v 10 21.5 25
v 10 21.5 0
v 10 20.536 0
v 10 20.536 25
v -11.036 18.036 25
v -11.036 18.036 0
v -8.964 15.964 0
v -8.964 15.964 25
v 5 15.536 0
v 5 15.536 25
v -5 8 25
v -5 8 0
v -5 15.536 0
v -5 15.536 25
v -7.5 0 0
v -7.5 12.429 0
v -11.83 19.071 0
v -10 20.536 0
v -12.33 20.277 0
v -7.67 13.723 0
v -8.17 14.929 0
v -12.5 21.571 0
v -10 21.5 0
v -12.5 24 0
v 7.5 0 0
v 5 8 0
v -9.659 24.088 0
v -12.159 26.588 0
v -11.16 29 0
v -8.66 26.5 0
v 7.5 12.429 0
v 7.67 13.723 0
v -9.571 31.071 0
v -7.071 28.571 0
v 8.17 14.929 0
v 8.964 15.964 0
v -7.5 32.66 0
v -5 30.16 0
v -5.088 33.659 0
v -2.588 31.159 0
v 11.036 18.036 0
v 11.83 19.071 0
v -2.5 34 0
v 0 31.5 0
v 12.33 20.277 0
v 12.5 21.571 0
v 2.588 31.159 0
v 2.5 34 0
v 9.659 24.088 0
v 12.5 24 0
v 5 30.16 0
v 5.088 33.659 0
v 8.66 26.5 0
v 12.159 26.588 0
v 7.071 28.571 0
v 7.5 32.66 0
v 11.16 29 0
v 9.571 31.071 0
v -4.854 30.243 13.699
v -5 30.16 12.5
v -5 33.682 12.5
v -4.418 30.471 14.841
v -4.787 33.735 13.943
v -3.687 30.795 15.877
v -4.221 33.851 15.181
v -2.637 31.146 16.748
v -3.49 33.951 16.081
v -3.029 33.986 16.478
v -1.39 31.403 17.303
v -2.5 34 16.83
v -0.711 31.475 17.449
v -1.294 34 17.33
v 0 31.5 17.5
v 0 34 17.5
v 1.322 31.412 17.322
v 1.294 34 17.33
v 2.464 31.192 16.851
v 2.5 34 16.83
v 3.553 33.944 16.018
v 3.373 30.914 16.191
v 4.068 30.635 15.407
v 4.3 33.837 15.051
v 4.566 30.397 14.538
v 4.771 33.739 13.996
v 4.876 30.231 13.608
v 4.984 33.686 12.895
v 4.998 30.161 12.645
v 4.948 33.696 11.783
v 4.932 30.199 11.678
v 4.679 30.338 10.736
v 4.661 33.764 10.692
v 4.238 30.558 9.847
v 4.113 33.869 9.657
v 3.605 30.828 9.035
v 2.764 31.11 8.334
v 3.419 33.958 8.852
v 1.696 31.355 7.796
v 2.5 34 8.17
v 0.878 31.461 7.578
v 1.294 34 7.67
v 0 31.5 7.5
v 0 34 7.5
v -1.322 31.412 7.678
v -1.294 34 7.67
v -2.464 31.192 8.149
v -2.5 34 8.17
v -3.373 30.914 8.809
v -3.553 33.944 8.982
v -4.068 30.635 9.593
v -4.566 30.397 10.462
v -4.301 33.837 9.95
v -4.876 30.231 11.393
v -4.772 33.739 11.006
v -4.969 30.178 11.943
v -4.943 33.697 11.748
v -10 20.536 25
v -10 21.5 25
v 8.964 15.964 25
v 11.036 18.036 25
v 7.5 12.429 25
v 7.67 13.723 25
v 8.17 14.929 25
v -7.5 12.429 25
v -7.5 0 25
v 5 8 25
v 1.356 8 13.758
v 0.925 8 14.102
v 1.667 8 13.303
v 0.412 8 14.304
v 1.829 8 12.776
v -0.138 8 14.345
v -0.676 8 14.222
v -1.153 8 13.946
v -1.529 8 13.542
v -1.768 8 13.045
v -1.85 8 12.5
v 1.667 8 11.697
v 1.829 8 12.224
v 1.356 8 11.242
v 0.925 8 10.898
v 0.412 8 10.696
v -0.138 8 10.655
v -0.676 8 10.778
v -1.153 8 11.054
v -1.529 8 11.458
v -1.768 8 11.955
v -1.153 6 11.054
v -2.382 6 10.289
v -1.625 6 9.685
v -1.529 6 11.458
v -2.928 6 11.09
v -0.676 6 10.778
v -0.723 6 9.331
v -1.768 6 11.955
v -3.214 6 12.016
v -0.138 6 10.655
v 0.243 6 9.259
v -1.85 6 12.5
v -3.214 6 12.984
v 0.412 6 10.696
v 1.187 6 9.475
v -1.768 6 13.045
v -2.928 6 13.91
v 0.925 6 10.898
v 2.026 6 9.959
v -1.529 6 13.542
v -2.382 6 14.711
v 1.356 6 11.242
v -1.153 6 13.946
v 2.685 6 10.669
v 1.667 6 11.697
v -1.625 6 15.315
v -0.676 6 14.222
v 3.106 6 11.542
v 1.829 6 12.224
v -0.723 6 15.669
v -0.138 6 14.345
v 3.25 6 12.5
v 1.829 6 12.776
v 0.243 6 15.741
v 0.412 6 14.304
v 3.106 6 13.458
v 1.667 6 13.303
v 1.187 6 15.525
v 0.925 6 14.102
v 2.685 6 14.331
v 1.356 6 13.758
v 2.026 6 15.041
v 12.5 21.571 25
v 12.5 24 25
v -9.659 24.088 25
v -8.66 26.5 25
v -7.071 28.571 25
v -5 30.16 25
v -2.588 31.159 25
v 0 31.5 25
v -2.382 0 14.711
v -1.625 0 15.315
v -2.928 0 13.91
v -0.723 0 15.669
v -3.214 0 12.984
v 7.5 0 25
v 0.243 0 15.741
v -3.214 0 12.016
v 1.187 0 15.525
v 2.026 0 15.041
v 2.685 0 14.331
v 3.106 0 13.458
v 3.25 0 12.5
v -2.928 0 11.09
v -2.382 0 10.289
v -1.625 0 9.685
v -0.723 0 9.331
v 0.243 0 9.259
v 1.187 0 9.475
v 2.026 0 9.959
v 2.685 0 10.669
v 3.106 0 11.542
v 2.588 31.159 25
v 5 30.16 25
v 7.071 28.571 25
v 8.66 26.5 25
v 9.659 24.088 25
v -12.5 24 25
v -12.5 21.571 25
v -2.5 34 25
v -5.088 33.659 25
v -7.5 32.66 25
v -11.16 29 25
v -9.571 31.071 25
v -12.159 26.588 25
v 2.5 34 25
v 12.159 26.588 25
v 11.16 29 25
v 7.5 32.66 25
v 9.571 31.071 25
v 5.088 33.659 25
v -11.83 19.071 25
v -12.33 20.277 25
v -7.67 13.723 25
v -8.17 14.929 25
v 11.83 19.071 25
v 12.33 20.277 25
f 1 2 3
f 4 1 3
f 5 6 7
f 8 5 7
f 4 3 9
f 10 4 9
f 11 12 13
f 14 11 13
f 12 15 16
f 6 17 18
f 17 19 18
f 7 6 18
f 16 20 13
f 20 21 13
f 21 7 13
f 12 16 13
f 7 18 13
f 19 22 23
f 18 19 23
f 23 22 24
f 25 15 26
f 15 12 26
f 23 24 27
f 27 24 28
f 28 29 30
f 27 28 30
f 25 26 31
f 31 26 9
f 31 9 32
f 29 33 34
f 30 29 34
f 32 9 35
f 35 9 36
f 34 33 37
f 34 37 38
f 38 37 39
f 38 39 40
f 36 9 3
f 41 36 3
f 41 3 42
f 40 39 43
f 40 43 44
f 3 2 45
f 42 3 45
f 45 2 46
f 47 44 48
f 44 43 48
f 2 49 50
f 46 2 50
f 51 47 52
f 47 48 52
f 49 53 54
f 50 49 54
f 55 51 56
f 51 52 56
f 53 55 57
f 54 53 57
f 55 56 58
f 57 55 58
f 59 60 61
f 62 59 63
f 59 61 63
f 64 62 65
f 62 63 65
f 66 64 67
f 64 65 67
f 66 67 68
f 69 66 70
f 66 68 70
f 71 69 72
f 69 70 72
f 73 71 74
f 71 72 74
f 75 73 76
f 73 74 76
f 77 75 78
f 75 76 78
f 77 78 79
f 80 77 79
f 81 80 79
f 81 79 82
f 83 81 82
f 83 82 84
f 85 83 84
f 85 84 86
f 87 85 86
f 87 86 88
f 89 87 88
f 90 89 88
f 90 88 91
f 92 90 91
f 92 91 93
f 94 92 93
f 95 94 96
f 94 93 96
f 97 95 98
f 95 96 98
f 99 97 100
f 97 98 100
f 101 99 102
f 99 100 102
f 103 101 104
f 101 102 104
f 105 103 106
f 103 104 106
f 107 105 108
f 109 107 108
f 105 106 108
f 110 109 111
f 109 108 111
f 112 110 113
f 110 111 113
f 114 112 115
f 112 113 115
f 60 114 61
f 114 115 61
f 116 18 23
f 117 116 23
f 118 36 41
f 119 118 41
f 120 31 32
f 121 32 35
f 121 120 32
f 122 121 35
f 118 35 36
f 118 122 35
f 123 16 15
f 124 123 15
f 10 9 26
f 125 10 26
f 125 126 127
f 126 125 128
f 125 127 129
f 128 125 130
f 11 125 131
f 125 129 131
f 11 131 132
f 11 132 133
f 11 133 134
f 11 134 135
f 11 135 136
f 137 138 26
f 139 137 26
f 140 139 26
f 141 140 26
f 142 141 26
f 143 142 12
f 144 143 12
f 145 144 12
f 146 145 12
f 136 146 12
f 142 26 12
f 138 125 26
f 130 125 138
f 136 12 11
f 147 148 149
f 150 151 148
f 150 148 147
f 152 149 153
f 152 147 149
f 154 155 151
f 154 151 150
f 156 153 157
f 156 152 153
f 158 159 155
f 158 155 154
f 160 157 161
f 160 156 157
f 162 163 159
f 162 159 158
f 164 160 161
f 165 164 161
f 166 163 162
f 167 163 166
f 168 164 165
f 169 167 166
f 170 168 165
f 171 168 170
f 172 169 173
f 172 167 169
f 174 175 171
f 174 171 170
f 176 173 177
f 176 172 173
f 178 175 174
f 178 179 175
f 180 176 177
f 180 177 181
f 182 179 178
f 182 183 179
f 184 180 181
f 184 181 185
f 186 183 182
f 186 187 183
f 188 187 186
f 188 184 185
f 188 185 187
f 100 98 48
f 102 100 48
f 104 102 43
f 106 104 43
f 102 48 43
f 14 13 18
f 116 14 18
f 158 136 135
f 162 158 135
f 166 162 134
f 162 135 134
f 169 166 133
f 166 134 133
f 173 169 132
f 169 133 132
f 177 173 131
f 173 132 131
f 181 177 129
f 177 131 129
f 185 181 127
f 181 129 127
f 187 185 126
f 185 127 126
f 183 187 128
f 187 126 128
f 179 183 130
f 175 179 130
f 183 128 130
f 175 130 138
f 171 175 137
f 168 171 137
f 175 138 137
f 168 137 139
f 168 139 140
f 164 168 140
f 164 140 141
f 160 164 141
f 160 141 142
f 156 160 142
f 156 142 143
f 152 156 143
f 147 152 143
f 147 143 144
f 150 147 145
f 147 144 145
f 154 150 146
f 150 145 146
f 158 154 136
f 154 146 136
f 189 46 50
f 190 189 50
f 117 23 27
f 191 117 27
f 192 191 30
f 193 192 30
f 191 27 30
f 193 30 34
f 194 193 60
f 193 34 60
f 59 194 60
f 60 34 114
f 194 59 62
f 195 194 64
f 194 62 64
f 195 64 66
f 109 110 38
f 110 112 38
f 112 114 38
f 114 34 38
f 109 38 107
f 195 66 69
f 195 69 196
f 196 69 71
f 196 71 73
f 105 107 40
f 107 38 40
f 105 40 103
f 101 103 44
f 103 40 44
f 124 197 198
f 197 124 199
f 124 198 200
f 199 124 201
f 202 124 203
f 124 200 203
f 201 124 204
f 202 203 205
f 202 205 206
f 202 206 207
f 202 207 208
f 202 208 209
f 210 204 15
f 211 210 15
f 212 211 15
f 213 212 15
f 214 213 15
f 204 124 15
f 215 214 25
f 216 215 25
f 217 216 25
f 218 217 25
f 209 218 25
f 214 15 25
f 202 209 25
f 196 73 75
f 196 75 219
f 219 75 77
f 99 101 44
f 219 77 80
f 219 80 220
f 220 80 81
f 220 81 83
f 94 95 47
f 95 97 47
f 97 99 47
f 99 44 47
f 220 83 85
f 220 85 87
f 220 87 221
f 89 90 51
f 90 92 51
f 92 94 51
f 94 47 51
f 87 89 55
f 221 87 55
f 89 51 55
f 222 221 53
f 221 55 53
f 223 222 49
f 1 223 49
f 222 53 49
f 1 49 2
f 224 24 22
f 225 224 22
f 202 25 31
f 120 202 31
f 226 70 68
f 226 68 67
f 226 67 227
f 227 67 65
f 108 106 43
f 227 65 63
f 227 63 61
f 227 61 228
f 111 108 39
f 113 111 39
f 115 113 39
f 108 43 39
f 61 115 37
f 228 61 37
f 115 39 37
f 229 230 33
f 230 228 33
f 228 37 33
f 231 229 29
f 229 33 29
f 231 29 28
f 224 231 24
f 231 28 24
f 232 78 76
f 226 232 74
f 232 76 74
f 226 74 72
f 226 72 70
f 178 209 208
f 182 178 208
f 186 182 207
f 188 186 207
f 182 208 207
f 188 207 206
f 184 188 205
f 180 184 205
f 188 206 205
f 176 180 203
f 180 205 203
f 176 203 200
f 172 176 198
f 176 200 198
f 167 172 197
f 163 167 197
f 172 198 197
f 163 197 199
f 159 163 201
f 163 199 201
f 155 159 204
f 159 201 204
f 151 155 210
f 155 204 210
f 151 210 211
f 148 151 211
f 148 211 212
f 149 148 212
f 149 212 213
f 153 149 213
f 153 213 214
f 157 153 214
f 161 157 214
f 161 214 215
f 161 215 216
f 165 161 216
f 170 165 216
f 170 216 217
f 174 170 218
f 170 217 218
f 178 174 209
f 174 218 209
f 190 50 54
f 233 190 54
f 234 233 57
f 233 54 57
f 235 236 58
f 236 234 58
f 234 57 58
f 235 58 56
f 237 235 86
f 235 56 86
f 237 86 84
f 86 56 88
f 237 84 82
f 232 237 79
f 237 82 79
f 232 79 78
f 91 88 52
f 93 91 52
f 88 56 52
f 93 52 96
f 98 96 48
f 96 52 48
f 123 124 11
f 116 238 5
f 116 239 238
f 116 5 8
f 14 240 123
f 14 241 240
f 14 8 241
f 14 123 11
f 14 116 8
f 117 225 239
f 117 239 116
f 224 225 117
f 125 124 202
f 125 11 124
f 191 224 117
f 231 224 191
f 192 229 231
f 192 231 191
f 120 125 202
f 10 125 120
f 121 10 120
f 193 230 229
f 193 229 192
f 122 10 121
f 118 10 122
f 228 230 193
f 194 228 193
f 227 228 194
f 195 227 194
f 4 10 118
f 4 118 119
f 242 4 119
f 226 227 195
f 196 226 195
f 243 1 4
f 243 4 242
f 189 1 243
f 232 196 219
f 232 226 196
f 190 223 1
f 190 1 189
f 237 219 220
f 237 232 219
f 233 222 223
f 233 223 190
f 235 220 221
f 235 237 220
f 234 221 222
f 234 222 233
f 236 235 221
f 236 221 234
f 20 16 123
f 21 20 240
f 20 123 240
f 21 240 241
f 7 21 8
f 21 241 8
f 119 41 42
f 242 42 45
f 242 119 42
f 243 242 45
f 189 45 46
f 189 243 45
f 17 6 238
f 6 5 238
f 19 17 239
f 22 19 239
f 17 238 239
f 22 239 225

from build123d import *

# Parameters (mm, degrees)
F1_DEPTH    = 25
F2_R        = 5
F3_R        = 3.25
F4_DEPTH    = 6
F5_R        = 1.85
F6_DEPTH    = 2
F7_R        = 5
F8_DEPTH    = 8.9
F9_T1_DEPTH = 75


# Not quite as in the source:
# - a fillet or chamfer that OpenCascade refuses, or shapes differently, is made with other operations: its cross-section is extruded or revolved along the edge and cut away or added


with BuildPart() as f1:
    # F0 (on Top) → F1 (new body)
    with BuildSketch(Plane.XY):
        Polygon((-7.5, 0), (0, 0), (7.5, 0), (7.5, 14.5), (12.5, 19.5), (12.5, 34), (0, 34), (-12.5, 34), (-12.5, 19.5), (-7.5, 14.5), align=None)
        with BuildLine():
            Line((-10, 20.5355339059), (-10, 21.5))
            ThreePointArc((-10, 21.5), (-7.0710678119, 28.5710678119), (0, 31.5))
            ThreePointArc((0, 31.5), (7.0710678119, 28.5710678119), (10, 21.5))
            Line((10, 21.5), (10, 20.5355339059))
            Line((10, 20.5355339059), (5, 15.5355339059))
            Line((5, 15.5355339059), (5, 8))
            Line((5, 8), (-5, 8))
            Line((-5, 8), (-5, 15.5355339059))
            Line((-5, 15.5355339059), (-10, 20.5355339059))
        make_face(mode=Mode.SUBTRACT)
    extrude(amount=F1_DEPTH)

    # F2
    f2_edges = [f1.edges().sort_by_distance(p)[0] for p in [
        (-12.5, 19.5, 12.5),
        (-7.5, 14.5, 12.5),
        (12.5, 19.5, 12.5),
        (7.5, 14.5, 12.5),
    ]]
    fillet(f2_edges, radius=F2_R)

    # F3 (on face) → F4 (cut)
    with BuildSketch(Plane.XZ):
        with Locations((0, 12.5)):
            Circle(F3_R)
    extrude(amount=-F4_DEPTH, mode=Mode.SUBTRACT)

    # F5 (on face) → F6 (cut)
    with BuildSketch(Plane(origin=(0, 8, 0), x_dir=(-1, 0, 0), z_dir=(0, 1, 0))):
        with Locations((0, 12.5)):
            Circle(F5_R)
    extrude(amount=-F6_DEPTH, mode=Mode.SUBTRACT)

    # F7 (on face) → F8 (cut)
    with BuildSketch(Plane(origin=(0, 34, 0), x_dir=(-1, 0, 0), z_dir=(0, 1, 0))):
        with Locations((0, 12.5)):
            Circle(F7_R)
    extrude(amount=-F8_DEPTH, mode=Mode.SUBTRACT)

    # F9: fillet of radius 10 on 2 edges, made by hand

    # F9_s2 → F9_t1 (cut)
    with BuildSketch(Plane.XY.offset(-25)):
        with BuildLine():
            ThreePointArc((-2.5, 34), (-9.5710678119, 31.0710678119), (-12.5, 24))
            Line((-12.5, 24), (-12.5, 34))
            Line((-12.5, 34), (-2.5, 34))
        make_face()
        with BuildLine():
            ThreePointArc((12.5, 24), (9.5710678119, 31.0710678119), (2.5, 34))
            Line((2.5, 34), (12.5, 34))
            Line((12.5, 34), (12.5, 24))
        make_face()
    extrude(amount=F9_T1_DEPTH, mode=Mode.SUBTRACT)


solid = f1.part
